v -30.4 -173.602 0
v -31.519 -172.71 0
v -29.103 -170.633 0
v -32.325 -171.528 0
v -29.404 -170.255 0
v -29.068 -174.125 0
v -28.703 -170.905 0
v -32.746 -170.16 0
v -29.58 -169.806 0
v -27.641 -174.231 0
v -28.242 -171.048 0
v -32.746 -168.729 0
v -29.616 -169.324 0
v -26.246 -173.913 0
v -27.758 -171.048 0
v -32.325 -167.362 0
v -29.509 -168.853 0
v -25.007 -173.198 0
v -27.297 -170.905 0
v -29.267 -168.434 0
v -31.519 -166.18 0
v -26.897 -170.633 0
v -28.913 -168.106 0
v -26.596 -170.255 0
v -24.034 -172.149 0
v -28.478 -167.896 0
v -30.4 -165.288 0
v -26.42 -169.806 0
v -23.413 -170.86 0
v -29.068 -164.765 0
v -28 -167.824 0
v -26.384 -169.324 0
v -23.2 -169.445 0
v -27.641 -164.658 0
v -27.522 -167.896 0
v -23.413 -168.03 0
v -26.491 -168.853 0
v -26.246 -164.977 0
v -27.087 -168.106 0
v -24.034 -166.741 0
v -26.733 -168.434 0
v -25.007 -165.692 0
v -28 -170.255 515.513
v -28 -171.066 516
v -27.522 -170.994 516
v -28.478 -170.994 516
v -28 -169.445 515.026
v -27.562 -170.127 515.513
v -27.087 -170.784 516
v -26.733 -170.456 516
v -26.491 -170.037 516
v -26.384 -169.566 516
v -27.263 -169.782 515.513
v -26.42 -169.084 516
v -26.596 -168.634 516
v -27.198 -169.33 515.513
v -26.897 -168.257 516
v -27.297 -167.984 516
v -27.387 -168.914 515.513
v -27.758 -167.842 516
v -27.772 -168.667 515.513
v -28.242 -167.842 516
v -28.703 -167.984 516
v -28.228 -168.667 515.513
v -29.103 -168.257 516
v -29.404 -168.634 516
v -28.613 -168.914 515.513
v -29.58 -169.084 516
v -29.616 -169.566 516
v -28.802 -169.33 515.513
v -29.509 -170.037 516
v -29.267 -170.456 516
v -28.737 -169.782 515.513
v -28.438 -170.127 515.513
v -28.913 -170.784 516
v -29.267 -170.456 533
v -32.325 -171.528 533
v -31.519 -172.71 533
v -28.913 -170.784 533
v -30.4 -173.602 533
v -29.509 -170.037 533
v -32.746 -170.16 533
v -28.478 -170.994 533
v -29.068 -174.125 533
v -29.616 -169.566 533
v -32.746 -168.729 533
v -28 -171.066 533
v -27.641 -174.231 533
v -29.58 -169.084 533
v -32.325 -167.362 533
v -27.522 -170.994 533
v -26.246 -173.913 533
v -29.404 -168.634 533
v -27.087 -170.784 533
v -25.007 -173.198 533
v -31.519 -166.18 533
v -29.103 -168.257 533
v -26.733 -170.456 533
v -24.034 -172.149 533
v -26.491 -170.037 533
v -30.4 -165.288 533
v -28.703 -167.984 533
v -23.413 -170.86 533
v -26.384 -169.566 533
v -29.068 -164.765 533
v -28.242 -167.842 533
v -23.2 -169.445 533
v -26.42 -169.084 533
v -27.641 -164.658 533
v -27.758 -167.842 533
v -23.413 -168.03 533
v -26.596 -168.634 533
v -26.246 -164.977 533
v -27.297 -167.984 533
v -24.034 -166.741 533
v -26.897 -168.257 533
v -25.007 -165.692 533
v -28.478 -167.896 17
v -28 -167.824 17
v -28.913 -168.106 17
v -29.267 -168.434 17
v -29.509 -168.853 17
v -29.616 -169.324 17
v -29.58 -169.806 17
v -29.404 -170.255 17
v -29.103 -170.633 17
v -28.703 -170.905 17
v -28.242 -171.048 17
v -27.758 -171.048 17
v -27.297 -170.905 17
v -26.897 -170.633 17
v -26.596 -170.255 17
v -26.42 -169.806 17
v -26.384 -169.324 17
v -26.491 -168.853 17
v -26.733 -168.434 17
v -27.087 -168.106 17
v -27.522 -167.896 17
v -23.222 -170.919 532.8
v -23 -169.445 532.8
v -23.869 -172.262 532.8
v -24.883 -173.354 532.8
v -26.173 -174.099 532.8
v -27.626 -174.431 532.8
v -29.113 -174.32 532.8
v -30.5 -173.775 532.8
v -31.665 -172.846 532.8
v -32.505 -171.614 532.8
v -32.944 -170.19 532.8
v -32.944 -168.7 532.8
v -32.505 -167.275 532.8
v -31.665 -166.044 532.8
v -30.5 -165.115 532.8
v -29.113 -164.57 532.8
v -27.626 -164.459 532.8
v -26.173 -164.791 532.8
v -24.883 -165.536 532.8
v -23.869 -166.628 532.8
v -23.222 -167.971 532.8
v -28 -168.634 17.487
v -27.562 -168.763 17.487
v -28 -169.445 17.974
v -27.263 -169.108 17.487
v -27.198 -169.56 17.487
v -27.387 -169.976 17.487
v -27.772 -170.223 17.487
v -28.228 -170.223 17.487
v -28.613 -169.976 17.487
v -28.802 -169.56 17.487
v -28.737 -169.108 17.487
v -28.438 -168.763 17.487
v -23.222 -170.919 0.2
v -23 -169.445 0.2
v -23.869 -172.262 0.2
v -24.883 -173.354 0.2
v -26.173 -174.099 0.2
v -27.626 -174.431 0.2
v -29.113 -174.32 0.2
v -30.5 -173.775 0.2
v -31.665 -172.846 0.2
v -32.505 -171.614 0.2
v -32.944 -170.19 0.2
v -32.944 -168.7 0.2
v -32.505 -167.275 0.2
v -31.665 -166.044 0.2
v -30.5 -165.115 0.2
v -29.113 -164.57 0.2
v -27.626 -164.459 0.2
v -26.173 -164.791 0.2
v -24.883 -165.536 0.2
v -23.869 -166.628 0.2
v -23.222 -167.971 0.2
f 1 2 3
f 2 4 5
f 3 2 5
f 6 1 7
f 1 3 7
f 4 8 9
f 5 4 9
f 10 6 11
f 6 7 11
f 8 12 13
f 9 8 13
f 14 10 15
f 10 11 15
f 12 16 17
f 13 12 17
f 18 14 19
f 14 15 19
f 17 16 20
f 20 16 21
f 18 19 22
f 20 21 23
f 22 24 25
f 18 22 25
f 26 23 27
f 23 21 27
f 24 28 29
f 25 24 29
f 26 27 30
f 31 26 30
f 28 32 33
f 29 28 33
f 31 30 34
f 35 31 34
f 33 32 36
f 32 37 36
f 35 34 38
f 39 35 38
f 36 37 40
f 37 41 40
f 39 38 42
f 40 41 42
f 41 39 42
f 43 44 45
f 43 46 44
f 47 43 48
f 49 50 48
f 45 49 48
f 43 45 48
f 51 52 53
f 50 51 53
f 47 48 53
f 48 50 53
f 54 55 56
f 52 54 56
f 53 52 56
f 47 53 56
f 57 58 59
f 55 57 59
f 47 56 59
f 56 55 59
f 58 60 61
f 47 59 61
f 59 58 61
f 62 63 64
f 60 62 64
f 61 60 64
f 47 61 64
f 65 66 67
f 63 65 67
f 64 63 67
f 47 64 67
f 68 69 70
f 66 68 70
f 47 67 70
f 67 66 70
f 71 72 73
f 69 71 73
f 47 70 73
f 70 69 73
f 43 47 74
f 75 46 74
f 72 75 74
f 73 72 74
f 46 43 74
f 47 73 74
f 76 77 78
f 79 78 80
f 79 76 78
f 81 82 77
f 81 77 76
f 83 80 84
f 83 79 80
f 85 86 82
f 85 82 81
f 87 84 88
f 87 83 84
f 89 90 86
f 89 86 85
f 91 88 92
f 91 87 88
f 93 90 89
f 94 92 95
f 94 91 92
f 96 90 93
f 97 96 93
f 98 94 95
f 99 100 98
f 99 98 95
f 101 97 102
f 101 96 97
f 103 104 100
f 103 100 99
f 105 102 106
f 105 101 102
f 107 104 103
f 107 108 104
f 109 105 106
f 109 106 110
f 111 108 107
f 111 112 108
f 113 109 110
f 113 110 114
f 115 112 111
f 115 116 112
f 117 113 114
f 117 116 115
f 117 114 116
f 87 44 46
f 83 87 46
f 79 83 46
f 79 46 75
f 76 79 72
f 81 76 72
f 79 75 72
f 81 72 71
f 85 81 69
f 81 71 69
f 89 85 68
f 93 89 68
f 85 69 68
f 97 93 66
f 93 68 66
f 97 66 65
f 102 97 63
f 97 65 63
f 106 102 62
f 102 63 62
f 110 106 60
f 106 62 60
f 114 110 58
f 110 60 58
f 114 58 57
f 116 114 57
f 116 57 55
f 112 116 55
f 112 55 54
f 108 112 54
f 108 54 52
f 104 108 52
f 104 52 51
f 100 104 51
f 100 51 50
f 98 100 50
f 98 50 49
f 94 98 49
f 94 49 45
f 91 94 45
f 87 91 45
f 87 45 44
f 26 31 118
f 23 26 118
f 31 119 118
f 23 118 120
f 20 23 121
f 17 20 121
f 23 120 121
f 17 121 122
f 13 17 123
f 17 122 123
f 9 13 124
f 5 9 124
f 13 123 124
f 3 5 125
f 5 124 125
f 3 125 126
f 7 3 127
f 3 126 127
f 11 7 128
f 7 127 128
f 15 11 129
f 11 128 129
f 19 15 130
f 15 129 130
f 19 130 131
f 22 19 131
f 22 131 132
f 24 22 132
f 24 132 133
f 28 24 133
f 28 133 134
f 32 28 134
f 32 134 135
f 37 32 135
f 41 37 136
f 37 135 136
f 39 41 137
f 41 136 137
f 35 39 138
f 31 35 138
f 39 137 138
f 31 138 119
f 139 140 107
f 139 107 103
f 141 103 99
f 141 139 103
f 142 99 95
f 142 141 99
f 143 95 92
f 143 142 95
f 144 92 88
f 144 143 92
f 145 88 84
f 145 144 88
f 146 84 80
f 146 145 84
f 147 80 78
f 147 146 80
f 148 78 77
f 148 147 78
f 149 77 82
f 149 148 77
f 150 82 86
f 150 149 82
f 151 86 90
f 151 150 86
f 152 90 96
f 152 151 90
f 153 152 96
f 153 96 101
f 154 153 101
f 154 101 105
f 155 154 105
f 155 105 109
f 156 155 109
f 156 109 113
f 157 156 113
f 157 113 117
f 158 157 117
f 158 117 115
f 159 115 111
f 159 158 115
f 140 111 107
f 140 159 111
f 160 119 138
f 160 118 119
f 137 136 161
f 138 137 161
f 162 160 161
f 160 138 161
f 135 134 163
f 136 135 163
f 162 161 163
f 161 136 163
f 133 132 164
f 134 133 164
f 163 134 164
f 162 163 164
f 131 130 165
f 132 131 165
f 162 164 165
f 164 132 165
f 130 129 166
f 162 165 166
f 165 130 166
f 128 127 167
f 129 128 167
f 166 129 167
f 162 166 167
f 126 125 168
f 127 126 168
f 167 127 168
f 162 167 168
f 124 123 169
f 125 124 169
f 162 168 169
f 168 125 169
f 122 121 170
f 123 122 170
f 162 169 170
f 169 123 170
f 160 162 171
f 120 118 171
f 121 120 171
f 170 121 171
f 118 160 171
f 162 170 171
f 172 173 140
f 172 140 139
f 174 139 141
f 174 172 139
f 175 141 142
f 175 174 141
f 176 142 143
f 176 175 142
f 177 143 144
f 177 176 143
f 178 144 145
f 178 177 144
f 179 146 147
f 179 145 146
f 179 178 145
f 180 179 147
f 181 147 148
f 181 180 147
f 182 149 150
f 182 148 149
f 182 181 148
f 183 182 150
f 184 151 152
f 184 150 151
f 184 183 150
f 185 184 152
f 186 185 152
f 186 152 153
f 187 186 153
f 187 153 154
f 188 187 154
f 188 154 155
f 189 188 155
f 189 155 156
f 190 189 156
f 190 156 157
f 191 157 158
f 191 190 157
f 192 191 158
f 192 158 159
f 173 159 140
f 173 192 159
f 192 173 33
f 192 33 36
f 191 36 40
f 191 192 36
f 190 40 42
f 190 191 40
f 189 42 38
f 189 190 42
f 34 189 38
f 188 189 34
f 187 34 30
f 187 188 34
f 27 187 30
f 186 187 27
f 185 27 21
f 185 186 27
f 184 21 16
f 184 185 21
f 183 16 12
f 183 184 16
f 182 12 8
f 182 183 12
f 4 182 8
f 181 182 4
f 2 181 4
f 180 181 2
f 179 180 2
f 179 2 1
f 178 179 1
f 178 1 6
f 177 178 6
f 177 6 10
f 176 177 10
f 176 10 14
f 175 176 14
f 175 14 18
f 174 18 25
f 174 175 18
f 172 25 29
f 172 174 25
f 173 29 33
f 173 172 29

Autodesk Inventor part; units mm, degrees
ref_plane "YZ Plane" through (0, 0, 0) normal (1, 0, 0) x (0, 1, 0)
ref_plane "XZ Plane" through (0, 0, 0) normal (0, 1, 0) x (-1, 0, 0)
ref_plane "XY Plane" through (0, 0, 0) normal (0, 0, 1) x (1, 0, 0)
sketch "Sketch1" plane through (0, 0, 0) normal (0, 0, 1) x (1, 0, 0)
  circle A0 centre (-28, -169.4449) radius 2 projected
  circle A1 centre (-28, -169.4449) radius 5
  point P0 (0, 0)
  dimension "d0" = 10
extrude "Extrusion1" add sketch "Sketch1" along normal blind 533 contours A0 | A1
sketch "Sketch2" plane through (-28, -169.4449, 533) normal (0, 0, 1) x (1, 0, 0)
  circle A0 centre (0, 0) radius 5 projected
  point P0 (28, 169.4449)
hole "Hole1" at (-28, -169.4449, 533) direction (0, 0, -1) diameter 3.242 depth 17 tip angle 118 thread size "M4x0.7" class "6H" standard "ISO Metric profile"
sketch "Sketch3" plane through (-28, -169.4449, 0) normal (0, 0, -1) x (-1, 0, 0)
  circle A0 centre (0, 0) radius 5 projected
  point P0 (-28, 169.4449)
hole "Hole2" at (-28, -169.4449, 0) direction (0, 0, 1) diameter 3.242 depth 17 tip angle 118 thread size "M4x0.7" class "6H" standard "ISO Metric profile"
chamfer "Chamfer1" distance 0.2 angle 45 2 edges at (-33, -169.4449, 0) (-33, -169.4449, 533)
properties material "Stainless Steel"
